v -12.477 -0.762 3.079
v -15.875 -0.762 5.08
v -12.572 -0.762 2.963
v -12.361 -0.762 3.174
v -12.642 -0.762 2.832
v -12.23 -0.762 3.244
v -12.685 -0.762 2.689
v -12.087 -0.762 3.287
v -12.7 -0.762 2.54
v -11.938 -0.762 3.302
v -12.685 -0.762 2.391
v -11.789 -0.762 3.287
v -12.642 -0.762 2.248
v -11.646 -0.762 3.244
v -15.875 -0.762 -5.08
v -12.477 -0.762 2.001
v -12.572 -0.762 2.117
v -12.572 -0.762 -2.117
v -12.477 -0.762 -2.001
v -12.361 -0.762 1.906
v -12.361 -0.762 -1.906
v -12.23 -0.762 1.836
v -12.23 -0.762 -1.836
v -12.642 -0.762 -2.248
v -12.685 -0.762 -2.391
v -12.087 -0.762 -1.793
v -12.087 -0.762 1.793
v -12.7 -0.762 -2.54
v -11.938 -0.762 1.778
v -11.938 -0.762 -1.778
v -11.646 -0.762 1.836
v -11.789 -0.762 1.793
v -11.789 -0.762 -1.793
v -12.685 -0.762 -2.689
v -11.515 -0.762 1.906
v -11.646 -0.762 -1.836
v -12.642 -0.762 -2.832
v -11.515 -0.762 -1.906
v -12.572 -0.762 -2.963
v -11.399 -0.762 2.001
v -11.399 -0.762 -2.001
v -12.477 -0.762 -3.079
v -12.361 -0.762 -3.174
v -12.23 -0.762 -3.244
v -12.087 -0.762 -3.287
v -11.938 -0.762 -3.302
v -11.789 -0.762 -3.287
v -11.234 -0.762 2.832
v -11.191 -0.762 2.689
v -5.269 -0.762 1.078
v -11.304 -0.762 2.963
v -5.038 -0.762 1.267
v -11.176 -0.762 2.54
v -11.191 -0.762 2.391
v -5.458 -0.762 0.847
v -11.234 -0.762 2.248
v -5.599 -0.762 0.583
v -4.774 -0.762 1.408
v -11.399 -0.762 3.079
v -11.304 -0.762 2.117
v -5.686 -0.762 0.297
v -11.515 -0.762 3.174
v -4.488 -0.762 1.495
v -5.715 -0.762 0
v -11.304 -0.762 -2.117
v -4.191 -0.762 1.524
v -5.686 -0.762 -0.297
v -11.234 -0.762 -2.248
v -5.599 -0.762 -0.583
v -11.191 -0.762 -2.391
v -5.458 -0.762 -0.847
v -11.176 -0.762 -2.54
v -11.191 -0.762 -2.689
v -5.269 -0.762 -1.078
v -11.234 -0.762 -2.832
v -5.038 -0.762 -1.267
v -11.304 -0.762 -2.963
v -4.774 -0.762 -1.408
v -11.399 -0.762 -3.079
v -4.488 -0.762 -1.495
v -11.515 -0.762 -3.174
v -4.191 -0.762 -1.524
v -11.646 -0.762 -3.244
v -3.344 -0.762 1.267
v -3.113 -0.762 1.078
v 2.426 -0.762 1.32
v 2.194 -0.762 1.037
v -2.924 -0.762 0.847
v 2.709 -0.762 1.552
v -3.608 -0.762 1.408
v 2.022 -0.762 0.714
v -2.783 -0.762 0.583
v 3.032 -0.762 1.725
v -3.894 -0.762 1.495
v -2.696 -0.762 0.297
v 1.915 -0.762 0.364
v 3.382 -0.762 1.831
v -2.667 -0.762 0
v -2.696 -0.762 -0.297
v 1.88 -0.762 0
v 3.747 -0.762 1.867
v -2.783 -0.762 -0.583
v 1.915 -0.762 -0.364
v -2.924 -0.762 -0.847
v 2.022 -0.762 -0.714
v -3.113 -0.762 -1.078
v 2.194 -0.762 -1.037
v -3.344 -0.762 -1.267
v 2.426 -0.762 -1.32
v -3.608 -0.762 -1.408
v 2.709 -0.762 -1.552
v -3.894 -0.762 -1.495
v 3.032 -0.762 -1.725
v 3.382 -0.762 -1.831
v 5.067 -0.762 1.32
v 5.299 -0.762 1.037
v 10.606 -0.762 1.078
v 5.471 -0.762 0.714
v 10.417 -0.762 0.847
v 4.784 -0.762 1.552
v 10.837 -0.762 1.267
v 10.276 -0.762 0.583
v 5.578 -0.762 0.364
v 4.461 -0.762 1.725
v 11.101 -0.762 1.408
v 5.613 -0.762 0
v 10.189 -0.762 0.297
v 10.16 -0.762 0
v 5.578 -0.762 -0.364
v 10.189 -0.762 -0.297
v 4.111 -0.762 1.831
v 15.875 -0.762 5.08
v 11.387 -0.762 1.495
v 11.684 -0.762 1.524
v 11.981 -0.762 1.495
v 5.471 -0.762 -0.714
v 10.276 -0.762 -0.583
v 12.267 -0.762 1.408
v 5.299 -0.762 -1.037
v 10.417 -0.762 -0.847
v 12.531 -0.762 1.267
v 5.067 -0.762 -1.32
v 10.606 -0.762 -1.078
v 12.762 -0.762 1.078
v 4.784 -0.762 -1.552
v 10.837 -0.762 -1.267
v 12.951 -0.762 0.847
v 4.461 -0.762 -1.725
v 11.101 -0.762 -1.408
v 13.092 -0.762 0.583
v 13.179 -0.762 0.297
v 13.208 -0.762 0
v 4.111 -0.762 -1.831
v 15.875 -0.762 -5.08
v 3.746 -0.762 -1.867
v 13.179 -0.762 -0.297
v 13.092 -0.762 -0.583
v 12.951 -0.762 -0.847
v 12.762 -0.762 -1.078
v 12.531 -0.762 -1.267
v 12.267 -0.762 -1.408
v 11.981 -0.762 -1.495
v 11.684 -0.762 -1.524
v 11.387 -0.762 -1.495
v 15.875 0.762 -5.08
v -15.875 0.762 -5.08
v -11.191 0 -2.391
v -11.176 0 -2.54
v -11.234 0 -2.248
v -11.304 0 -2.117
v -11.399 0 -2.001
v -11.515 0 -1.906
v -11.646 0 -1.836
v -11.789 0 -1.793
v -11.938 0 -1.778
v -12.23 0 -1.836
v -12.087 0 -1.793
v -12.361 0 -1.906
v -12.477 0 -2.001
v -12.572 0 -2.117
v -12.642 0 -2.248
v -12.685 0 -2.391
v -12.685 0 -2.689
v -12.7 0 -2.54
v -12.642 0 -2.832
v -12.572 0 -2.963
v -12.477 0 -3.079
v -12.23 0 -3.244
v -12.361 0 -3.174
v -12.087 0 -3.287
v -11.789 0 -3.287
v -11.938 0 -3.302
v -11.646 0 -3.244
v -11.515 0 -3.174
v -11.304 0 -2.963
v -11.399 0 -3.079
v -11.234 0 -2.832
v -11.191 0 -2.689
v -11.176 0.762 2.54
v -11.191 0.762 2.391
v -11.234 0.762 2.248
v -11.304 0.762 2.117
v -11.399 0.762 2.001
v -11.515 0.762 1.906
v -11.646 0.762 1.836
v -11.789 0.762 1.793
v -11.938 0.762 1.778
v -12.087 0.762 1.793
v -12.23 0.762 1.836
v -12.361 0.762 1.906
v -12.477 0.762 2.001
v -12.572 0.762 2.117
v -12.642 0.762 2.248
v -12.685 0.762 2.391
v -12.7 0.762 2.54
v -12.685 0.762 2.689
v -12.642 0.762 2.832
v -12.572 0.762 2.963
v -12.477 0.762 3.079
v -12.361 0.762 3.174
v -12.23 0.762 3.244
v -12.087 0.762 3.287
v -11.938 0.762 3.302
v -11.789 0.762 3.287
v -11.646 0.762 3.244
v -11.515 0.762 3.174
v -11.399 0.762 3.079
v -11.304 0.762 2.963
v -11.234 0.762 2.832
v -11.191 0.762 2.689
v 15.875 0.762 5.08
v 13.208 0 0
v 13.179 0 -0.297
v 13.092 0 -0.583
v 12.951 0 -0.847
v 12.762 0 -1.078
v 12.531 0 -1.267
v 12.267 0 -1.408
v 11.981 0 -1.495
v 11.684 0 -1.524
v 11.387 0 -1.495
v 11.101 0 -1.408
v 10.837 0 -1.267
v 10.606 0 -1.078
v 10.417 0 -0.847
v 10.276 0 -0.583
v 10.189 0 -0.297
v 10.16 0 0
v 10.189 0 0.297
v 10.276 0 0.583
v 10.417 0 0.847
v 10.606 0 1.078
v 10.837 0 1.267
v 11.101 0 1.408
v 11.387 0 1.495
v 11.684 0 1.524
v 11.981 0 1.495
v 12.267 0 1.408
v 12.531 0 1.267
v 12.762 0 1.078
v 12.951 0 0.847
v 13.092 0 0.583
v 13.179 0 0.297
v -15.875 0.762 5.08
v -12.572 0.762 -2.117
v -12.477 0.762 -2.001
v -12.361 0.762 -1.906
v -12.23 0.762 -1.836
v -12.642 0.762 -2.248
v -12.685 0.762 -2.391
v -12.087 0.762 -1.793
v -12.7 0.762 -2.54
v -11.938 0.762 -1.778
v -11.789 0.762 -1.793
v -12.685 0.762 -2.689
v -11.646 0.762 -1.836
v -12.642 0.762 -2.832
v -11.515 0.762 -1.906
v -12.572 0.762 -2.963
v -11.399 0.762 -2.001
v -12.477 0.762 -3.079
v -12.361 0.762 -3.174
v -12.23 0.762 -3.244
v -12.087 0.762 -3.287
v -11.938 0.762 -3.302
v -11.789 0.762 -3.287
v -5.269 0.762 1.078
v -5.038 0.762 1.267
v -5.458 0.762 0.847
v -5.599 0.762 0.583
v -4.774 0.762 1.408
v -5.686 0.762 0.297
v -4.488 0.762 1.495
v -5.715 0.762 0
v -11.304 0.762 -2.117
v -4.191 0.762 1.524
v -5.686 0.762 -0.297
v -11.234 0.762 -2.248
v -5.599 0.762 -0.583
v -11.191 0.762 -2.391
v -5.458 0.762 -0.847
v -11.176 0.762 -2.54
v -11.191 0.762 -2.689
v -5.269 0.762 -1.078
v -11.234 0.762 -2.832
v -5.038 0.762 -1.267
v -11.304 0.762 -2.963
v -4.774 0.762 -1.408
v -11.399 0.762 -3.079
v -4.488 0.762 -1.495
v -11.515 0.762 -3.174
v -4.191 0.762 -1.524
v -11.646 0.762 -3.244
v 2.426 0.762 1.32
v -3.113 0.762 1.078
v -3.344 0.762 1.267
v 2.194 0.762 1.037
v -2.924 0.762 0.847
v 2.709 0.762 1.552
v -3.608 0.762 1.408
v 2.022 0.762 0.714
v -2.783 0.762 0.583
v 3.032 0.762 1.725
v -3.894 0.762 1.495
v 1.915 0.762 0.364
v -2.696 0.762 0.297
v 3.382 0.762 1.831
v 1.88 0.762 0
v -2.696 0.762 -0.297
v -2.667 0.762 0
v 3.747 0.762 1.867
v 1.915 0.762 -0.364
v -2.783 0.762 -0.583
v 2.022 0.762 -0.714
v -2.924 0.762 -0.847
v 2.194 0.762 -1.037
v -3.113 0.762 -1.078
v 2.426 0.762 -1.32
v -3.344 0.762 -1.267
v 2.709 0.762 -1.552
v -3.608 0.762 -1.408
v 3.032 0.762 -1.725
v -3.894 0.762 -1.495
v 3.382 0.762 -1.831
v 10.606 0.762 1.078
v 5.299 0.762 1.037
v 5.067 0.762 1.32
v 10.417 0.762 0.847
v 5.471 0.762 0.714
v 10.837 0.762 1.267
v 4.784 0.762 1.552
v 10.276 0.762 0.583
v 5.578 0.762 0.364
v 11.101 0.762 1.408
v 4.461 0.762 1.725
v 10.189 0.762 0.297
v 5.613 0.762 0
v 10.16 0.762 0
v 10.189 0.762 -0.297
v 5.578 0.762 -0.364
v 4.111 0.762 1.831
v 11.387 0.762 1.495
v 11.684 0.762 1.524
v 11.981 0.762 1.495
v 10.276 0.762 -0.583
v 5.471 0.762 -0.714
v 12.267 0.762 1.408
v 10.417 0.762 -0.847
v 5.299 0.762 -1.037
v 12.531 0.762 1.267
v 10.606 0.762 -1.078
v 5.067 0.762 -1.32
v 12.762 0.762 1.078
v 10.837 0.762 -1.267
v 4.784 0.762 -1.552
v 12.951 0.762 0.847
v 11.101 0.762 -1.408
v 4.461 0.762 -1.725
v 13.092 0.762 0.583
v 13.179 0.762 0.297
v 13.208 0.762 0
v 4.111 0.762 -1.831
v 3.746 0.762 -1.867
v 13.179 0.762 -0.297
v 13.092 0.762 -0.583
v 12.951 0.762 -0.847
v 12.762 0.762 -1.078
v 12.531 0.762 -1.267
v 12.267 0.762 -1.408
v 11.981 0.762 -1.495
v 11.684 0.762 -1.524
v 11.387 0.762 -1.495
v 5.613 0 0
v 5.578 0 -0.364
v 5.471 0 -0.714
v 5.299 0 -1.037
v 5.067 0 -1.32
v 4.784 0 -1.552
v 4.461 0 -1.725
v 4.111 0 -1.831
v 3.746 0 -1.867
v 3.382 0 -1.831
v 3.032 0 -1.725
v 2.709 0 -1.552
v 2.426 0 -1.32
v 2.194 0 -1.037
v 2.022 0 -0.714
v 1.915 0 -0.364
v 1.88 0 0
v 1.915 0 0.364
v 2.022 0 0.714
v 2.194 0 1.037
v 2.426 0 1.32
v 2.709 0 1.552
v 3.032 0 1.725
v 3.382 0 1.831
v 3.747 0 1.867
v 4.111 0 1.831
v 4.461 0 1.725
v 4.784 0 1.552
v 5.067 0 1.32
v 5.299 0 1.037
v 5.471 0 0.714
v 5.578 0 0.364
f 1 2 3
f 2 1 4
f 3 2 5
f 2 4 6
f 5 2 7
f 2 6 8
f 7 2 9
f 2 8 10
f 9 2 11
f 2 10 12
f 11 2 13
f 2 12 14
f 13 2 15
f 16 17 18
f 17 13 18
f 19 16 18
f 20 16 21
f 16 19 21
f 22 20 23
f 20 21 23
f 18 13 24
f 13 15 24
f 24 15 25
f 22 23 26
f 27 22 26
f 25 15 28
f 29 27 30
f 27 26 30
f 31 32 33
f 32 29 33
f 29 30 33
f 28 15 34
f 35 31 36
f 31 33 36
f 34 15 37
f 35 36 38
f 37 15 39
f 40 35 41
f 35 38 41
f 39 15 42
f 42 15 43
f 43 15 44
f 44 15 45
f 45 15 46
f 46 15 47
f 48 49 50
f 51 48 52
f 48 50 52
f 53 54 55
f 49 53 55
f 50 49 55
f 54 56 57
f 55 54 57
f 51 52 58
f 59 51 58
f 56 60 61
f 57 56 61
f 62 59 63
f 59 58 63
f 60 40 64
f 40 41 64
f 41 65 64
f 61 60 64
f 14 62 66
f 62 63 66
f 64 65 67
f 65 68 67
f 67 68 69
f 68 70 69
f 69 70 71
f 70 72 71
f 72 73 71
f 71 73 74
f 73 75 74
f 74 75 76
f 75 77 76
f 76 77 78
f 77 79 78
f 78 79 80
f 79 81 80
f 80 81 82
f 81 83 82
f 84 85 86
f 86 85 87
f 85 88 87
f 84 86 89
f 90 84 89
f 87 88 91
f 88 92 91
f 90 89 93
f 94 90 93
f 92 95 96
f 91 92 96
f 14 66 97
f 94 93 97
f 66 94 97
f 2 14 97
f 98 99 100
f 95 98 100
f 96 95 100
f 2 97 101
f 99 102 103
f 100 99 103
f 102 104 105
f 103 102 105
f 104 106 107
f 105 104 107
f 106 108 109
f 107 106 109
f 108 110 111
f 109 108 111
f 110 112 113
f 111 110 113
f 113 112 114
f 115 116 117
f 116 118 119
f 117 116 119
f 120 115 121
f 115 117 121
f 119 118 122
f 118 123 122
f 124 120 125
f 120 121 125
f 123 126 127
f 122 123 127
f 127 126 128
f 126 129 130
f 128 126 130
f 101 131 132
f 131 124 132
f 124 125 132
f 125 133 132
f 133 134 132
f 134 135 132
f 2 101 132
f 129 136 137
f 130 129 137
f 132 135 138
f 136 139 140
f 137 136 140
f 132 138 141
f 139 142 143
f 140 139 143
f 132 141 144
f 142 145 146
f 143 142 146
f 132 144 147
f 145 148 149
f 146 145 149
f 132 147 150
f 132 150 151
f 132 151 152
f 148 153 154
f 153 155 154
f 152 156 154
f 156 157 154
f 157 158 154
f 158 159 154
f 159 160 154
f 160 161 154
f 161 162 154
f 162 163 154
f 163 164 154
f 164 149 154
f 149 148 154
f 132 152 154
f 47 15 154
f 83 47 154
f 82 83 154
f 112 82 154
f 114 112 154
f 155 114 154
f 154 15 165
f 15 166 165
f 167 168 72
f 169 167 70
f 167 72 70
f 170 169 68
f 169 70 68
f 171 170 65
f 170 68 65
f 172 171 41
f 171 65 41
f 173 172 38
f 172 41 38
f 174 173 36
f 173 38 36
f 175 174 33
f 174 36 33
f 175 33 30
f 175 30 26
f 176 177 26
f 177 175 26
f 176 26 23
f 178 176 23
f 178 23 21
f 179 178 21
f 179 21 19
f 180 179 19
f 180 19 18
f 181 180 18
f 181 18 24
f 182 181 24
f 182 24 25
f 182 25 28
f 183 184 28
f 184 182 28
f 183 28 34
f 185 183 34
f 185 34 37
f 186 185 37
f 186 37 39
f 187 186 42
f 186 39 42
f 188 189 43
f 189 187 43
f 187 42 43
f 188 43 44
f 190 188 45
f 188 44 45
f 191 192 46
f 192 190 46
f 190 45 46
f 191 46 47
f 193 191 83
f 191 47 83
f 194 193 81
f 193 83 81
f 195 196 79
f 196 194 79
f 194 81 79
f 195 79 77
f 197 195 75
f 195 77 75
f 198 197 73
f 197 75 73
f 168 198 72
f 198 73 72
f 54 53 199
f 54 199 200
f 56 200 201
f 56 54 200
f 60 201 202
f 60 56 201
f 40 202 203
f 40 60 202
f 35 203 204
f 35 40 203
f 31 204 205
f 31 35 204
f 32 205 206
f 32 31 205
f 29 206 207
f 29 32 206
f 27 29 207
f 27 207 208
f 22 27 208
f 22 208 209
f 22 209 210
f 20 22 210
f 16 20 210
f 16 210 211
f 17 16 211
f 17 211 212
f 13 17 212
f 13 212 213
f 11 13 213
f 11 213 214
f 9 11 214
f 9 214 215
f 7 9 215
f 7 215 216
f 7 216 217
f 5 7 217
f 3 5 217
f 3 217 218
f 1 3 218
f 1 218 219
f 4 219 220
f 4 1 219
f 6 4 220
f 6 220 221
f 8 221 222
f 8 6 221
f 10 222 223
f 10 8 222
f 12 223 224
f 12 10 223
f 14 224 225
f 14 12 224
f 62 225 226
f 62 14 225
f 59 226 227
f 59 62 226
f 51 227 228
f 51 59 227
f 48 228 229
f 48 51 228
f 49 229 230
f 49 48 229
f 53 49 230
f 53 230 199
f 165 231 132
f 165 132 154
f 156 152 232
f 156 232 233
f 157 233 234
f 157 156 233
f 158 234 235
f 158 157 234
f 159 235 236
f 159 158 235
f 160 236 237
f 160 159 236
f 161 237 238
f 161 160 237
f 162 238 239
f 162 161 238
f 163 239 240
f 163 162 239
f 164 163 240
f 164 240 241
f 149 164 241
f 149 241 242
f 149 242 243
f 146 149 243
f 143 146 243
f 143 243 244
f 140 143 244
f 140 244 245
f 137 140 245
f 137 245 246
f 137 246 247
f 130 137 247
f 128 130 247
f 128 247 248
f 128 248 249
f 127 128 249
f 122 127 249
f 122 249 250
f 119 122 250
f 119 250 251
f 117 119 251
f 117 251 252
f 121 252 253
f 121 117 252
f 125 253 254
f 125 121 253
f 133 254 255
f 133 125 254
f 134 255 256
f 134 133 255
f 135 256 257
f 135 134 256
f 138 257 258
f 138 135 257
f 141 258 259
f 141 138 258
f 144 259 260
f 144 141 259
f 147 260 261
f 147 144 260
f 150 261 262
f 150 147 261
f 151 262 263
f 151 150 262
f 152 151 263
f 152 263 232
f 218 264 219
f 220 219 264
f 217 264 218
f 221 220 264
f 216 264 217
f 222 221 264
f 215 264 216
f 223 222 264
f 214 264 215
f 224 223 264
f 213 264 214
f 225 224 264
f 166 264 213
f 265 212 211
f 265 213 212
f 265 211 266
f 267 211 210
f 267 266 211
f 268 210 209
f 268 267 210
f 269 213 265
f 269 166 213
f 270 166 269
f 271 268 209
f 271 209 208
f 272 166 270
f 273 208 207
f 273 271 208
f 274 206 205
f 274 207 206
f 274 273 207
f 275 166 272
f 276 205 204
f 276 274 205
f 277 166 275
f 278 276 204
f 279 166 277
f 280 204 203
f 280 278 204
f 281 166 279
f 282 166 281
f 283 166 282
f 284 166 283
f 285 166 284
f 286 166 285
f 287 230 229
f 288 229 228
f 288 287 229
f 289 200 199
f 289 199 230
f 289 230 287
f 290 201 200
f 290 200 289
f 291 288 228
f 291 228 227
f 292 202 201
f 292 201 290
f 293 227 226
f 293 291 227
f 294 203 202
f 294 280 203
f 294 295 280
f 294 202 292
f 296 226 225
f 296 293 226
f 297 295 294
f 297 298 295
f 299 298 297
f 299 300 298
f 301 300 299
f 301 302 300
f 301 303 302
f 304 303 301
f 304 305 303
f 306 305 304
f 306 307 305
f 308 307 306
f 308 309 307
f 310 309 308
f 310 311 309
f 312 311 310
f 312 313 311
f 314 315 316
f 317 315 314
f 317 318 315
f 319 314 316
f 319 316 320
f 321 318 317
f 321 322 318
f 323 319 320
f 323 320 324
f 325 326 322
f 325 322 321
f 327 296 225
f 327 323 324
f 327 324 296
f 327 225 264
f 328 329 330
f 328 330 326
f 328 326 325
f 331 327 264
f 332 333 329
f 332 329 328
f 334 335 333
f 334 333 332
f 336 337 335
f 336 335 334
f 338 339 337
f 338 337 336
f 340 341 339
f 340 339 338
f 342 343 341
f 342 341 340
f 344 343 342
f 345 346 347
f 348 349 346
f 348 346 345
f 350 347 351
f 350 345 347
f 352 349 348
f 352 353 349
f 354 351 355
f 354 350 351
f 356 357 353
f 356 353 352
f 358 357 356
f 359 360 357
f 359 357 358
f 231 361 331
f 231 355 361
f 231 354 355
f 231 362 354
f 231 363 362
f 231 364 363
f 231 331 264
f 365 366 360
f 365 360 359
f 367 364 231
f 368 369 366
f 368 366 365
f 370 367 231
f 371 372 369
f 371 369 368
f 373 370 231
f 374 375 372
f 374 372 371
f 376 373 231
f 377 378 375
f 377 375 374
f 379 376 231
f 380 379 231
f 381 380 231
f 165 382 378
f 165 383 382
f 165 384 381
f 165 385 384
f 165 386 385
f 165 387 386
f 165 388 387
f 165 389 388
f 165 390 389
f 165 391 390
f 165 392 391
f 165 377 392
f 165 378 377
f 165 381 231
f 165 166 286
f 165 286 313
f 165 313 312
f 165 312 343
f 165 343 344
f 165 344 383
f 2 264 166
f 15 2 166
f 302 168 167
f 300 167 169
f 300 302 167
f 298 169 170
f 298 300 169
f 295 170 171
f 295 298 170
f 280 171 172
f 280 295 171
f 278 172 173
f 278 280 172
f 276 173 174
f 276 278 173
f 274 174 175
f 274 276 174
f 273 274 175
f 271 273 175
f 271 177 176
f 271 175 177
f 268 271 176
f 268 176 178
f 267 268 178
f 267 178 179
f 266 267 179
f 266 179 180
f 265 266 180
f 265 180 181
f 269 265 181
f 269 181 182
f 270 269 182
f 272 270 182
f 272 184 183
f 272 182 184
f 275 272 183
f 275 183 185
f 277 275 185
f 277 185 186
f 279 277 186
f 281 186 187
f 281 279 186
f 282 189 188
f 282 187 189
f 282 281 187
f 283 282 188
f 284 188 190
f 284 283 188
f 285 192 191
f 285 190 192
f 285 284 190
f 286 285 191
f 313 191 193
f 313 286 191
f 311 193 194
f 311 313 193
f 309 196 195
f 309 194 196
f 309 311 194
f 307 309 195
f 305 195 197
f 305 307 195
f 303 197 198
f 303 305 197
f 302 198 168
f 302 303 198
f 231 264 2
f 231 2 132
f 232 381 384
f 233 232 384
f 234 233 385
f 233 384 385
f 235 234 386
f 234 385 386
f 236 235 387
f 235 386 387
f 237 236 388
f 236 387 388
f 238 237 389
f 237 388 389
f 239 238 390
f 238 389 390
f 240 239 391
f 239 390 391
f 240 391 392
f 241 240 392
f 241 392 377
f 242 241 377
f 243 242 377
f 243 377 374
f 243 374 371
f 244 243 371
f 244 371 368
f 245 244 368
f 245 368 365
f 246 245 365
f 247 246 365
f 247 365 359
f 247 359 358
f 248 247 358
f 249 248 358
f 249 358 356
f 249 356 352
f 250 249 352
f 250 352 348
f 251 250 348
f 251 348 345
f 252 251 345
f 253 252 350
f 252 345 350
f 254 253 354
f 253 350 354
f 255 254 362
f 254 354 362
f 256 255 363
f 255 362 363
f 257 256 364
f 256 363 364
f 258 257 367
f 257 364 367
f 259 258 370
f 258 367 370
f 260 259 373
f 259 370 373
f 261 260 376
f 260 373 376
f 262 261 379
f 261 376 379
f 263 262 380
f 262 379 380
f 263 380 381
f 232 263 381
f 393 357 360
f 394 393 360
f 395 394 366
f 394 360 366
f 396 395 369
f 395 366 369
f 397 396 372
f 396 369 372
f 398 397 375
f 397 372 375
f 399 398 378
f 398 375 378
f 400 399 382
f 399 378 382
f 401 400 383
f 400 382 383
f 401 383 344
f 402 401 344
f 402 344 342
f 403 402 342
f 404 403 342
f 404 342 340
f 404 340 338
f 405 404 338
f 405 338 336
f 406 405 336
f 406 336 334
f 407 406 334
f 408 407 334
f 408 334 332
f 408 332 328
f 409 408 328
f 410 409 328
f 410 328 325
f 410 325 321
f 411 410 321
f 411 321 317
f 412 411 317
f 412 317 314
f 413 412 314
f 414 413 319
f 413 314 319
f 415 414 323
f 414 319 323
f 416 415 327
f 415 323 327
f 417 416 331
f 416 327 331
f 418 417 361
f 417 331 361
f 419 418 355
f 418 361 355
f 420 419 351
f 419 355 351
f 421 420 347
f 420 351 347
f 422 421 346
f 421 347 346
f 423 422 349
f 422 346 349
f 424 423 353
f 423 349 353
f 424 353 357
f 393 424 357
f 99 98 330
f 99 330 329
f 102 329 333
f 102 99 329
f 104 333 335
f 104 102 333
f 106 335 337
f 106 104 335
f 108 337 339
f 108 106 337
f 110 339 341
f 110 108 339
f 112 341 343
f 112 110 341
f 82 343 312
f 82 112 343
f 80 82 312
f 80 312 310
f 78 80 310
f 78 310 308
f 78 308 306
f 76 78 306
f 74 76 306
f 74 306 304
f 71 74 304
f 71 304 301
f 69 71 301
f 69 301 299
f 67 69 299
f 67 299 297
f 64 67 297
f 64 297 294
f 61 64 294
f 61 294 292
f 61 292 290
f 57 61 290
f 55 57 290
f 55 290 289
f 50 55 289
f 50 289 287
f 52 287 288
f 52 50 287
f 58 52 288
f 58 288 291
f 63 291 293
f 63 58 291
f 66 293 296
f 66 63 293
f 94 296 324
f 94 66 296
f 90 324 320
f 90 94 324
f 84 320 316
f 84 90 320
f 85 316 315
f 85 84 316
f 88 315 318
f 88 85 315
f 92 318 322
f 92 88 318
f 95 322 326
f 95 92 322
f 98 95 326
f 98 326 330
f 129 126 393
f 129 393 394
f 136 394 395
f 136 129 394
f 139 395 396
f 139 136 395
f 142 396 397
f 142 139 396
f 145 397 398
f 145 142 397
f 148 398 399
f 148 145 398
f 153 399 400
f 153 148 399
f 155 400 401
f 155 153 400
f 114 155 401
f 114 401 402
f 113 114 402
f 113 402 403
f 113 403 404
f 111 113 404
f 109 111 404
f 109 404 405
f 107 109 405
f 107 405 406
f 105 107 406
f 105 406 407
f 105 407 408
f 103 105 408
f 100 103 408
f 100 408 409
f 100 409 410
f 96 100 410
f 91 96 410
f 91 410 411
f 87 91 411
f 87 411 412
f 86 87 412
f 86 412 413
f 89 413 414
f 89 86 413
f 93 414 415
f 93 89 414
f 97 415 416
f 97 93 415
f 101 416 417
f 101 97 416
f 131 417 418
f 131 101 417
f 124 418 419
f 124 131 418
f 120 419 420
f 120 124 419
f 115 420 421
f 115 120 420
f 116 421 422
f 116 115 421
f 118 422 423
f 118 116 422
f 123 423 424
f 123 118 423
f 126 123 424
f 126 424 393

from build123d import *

# Parameters (mm, degrees)
SKETCH2_W           = 31.75
SKETCH2_H           = 10.16
BOSS_EXTRUDE1_DEPTH = 0.762
SKETCH3_R           = 1.524
SKETCH3_R_2         = 1.8669
CUT_EXTRUDE1_DEPTH  = 1.762
SKETCH4_R           = 0.762
CUT_EXTRUDE2_DEPTH  = 1.762


with BuildPart() as part:
    # Sketch2 → Boss-Extrude1 (new body)
    with BuildSketch(Plane(origin=(0, 0, 0), x_dir=(1, 0, 0), z_dir=(0, 1, 0))):
        Rectangle(SKETCH2_W, SKETCH2_H)
    extrude(amount=BOSS_EXTRUDE1_DEPTH)

    # Sketch3 → Cut-Extrude1 (cut, through all)
    with BuildSketch(Plane(origin=(0, 0.762, 0), x_dir=(1, 0, 0), z_dir=(0, 1, 0))):
        with Locations((-4.191, 0)):
            Circle(SKETCH3_R)
        with Locations((3.7465, 0)):
            Circle(SKETCH3_R_2)
        with Locations((11.684, 0)):
            Circle(SKETCH3_R)
    extrude(amount=-CUT_EXTRUDE1_DEPTH, mode=Mode.SUBTRACT)

    # Sketch4 → Cut-Extrude2 (cut, through all)
    with BuildSketch(Plane(origin=(0, 0.762, 0), x_dir=(1, 0, 0), z_dir=(0, 1, 0))):
        with Locations((-11.938, -2.54)):
            Circle(SKETCH4_R)
    cut_extrude2 = extrude(amount=-CUT_EXTRUDE2_DEPTH, mode=Mode.SUBTRACT)

    # Mirror1: Cut-Extrude2 across plane
    add(cut_extrude2.mirror(Plane.XY), mode=Mode.SUBTRACT)

    # Mirror4: part across plane


with BuildPart() as part_1:
    add(part.part)
    add(part.part.mirror(Plane.ZX))


solid = part_1.part
